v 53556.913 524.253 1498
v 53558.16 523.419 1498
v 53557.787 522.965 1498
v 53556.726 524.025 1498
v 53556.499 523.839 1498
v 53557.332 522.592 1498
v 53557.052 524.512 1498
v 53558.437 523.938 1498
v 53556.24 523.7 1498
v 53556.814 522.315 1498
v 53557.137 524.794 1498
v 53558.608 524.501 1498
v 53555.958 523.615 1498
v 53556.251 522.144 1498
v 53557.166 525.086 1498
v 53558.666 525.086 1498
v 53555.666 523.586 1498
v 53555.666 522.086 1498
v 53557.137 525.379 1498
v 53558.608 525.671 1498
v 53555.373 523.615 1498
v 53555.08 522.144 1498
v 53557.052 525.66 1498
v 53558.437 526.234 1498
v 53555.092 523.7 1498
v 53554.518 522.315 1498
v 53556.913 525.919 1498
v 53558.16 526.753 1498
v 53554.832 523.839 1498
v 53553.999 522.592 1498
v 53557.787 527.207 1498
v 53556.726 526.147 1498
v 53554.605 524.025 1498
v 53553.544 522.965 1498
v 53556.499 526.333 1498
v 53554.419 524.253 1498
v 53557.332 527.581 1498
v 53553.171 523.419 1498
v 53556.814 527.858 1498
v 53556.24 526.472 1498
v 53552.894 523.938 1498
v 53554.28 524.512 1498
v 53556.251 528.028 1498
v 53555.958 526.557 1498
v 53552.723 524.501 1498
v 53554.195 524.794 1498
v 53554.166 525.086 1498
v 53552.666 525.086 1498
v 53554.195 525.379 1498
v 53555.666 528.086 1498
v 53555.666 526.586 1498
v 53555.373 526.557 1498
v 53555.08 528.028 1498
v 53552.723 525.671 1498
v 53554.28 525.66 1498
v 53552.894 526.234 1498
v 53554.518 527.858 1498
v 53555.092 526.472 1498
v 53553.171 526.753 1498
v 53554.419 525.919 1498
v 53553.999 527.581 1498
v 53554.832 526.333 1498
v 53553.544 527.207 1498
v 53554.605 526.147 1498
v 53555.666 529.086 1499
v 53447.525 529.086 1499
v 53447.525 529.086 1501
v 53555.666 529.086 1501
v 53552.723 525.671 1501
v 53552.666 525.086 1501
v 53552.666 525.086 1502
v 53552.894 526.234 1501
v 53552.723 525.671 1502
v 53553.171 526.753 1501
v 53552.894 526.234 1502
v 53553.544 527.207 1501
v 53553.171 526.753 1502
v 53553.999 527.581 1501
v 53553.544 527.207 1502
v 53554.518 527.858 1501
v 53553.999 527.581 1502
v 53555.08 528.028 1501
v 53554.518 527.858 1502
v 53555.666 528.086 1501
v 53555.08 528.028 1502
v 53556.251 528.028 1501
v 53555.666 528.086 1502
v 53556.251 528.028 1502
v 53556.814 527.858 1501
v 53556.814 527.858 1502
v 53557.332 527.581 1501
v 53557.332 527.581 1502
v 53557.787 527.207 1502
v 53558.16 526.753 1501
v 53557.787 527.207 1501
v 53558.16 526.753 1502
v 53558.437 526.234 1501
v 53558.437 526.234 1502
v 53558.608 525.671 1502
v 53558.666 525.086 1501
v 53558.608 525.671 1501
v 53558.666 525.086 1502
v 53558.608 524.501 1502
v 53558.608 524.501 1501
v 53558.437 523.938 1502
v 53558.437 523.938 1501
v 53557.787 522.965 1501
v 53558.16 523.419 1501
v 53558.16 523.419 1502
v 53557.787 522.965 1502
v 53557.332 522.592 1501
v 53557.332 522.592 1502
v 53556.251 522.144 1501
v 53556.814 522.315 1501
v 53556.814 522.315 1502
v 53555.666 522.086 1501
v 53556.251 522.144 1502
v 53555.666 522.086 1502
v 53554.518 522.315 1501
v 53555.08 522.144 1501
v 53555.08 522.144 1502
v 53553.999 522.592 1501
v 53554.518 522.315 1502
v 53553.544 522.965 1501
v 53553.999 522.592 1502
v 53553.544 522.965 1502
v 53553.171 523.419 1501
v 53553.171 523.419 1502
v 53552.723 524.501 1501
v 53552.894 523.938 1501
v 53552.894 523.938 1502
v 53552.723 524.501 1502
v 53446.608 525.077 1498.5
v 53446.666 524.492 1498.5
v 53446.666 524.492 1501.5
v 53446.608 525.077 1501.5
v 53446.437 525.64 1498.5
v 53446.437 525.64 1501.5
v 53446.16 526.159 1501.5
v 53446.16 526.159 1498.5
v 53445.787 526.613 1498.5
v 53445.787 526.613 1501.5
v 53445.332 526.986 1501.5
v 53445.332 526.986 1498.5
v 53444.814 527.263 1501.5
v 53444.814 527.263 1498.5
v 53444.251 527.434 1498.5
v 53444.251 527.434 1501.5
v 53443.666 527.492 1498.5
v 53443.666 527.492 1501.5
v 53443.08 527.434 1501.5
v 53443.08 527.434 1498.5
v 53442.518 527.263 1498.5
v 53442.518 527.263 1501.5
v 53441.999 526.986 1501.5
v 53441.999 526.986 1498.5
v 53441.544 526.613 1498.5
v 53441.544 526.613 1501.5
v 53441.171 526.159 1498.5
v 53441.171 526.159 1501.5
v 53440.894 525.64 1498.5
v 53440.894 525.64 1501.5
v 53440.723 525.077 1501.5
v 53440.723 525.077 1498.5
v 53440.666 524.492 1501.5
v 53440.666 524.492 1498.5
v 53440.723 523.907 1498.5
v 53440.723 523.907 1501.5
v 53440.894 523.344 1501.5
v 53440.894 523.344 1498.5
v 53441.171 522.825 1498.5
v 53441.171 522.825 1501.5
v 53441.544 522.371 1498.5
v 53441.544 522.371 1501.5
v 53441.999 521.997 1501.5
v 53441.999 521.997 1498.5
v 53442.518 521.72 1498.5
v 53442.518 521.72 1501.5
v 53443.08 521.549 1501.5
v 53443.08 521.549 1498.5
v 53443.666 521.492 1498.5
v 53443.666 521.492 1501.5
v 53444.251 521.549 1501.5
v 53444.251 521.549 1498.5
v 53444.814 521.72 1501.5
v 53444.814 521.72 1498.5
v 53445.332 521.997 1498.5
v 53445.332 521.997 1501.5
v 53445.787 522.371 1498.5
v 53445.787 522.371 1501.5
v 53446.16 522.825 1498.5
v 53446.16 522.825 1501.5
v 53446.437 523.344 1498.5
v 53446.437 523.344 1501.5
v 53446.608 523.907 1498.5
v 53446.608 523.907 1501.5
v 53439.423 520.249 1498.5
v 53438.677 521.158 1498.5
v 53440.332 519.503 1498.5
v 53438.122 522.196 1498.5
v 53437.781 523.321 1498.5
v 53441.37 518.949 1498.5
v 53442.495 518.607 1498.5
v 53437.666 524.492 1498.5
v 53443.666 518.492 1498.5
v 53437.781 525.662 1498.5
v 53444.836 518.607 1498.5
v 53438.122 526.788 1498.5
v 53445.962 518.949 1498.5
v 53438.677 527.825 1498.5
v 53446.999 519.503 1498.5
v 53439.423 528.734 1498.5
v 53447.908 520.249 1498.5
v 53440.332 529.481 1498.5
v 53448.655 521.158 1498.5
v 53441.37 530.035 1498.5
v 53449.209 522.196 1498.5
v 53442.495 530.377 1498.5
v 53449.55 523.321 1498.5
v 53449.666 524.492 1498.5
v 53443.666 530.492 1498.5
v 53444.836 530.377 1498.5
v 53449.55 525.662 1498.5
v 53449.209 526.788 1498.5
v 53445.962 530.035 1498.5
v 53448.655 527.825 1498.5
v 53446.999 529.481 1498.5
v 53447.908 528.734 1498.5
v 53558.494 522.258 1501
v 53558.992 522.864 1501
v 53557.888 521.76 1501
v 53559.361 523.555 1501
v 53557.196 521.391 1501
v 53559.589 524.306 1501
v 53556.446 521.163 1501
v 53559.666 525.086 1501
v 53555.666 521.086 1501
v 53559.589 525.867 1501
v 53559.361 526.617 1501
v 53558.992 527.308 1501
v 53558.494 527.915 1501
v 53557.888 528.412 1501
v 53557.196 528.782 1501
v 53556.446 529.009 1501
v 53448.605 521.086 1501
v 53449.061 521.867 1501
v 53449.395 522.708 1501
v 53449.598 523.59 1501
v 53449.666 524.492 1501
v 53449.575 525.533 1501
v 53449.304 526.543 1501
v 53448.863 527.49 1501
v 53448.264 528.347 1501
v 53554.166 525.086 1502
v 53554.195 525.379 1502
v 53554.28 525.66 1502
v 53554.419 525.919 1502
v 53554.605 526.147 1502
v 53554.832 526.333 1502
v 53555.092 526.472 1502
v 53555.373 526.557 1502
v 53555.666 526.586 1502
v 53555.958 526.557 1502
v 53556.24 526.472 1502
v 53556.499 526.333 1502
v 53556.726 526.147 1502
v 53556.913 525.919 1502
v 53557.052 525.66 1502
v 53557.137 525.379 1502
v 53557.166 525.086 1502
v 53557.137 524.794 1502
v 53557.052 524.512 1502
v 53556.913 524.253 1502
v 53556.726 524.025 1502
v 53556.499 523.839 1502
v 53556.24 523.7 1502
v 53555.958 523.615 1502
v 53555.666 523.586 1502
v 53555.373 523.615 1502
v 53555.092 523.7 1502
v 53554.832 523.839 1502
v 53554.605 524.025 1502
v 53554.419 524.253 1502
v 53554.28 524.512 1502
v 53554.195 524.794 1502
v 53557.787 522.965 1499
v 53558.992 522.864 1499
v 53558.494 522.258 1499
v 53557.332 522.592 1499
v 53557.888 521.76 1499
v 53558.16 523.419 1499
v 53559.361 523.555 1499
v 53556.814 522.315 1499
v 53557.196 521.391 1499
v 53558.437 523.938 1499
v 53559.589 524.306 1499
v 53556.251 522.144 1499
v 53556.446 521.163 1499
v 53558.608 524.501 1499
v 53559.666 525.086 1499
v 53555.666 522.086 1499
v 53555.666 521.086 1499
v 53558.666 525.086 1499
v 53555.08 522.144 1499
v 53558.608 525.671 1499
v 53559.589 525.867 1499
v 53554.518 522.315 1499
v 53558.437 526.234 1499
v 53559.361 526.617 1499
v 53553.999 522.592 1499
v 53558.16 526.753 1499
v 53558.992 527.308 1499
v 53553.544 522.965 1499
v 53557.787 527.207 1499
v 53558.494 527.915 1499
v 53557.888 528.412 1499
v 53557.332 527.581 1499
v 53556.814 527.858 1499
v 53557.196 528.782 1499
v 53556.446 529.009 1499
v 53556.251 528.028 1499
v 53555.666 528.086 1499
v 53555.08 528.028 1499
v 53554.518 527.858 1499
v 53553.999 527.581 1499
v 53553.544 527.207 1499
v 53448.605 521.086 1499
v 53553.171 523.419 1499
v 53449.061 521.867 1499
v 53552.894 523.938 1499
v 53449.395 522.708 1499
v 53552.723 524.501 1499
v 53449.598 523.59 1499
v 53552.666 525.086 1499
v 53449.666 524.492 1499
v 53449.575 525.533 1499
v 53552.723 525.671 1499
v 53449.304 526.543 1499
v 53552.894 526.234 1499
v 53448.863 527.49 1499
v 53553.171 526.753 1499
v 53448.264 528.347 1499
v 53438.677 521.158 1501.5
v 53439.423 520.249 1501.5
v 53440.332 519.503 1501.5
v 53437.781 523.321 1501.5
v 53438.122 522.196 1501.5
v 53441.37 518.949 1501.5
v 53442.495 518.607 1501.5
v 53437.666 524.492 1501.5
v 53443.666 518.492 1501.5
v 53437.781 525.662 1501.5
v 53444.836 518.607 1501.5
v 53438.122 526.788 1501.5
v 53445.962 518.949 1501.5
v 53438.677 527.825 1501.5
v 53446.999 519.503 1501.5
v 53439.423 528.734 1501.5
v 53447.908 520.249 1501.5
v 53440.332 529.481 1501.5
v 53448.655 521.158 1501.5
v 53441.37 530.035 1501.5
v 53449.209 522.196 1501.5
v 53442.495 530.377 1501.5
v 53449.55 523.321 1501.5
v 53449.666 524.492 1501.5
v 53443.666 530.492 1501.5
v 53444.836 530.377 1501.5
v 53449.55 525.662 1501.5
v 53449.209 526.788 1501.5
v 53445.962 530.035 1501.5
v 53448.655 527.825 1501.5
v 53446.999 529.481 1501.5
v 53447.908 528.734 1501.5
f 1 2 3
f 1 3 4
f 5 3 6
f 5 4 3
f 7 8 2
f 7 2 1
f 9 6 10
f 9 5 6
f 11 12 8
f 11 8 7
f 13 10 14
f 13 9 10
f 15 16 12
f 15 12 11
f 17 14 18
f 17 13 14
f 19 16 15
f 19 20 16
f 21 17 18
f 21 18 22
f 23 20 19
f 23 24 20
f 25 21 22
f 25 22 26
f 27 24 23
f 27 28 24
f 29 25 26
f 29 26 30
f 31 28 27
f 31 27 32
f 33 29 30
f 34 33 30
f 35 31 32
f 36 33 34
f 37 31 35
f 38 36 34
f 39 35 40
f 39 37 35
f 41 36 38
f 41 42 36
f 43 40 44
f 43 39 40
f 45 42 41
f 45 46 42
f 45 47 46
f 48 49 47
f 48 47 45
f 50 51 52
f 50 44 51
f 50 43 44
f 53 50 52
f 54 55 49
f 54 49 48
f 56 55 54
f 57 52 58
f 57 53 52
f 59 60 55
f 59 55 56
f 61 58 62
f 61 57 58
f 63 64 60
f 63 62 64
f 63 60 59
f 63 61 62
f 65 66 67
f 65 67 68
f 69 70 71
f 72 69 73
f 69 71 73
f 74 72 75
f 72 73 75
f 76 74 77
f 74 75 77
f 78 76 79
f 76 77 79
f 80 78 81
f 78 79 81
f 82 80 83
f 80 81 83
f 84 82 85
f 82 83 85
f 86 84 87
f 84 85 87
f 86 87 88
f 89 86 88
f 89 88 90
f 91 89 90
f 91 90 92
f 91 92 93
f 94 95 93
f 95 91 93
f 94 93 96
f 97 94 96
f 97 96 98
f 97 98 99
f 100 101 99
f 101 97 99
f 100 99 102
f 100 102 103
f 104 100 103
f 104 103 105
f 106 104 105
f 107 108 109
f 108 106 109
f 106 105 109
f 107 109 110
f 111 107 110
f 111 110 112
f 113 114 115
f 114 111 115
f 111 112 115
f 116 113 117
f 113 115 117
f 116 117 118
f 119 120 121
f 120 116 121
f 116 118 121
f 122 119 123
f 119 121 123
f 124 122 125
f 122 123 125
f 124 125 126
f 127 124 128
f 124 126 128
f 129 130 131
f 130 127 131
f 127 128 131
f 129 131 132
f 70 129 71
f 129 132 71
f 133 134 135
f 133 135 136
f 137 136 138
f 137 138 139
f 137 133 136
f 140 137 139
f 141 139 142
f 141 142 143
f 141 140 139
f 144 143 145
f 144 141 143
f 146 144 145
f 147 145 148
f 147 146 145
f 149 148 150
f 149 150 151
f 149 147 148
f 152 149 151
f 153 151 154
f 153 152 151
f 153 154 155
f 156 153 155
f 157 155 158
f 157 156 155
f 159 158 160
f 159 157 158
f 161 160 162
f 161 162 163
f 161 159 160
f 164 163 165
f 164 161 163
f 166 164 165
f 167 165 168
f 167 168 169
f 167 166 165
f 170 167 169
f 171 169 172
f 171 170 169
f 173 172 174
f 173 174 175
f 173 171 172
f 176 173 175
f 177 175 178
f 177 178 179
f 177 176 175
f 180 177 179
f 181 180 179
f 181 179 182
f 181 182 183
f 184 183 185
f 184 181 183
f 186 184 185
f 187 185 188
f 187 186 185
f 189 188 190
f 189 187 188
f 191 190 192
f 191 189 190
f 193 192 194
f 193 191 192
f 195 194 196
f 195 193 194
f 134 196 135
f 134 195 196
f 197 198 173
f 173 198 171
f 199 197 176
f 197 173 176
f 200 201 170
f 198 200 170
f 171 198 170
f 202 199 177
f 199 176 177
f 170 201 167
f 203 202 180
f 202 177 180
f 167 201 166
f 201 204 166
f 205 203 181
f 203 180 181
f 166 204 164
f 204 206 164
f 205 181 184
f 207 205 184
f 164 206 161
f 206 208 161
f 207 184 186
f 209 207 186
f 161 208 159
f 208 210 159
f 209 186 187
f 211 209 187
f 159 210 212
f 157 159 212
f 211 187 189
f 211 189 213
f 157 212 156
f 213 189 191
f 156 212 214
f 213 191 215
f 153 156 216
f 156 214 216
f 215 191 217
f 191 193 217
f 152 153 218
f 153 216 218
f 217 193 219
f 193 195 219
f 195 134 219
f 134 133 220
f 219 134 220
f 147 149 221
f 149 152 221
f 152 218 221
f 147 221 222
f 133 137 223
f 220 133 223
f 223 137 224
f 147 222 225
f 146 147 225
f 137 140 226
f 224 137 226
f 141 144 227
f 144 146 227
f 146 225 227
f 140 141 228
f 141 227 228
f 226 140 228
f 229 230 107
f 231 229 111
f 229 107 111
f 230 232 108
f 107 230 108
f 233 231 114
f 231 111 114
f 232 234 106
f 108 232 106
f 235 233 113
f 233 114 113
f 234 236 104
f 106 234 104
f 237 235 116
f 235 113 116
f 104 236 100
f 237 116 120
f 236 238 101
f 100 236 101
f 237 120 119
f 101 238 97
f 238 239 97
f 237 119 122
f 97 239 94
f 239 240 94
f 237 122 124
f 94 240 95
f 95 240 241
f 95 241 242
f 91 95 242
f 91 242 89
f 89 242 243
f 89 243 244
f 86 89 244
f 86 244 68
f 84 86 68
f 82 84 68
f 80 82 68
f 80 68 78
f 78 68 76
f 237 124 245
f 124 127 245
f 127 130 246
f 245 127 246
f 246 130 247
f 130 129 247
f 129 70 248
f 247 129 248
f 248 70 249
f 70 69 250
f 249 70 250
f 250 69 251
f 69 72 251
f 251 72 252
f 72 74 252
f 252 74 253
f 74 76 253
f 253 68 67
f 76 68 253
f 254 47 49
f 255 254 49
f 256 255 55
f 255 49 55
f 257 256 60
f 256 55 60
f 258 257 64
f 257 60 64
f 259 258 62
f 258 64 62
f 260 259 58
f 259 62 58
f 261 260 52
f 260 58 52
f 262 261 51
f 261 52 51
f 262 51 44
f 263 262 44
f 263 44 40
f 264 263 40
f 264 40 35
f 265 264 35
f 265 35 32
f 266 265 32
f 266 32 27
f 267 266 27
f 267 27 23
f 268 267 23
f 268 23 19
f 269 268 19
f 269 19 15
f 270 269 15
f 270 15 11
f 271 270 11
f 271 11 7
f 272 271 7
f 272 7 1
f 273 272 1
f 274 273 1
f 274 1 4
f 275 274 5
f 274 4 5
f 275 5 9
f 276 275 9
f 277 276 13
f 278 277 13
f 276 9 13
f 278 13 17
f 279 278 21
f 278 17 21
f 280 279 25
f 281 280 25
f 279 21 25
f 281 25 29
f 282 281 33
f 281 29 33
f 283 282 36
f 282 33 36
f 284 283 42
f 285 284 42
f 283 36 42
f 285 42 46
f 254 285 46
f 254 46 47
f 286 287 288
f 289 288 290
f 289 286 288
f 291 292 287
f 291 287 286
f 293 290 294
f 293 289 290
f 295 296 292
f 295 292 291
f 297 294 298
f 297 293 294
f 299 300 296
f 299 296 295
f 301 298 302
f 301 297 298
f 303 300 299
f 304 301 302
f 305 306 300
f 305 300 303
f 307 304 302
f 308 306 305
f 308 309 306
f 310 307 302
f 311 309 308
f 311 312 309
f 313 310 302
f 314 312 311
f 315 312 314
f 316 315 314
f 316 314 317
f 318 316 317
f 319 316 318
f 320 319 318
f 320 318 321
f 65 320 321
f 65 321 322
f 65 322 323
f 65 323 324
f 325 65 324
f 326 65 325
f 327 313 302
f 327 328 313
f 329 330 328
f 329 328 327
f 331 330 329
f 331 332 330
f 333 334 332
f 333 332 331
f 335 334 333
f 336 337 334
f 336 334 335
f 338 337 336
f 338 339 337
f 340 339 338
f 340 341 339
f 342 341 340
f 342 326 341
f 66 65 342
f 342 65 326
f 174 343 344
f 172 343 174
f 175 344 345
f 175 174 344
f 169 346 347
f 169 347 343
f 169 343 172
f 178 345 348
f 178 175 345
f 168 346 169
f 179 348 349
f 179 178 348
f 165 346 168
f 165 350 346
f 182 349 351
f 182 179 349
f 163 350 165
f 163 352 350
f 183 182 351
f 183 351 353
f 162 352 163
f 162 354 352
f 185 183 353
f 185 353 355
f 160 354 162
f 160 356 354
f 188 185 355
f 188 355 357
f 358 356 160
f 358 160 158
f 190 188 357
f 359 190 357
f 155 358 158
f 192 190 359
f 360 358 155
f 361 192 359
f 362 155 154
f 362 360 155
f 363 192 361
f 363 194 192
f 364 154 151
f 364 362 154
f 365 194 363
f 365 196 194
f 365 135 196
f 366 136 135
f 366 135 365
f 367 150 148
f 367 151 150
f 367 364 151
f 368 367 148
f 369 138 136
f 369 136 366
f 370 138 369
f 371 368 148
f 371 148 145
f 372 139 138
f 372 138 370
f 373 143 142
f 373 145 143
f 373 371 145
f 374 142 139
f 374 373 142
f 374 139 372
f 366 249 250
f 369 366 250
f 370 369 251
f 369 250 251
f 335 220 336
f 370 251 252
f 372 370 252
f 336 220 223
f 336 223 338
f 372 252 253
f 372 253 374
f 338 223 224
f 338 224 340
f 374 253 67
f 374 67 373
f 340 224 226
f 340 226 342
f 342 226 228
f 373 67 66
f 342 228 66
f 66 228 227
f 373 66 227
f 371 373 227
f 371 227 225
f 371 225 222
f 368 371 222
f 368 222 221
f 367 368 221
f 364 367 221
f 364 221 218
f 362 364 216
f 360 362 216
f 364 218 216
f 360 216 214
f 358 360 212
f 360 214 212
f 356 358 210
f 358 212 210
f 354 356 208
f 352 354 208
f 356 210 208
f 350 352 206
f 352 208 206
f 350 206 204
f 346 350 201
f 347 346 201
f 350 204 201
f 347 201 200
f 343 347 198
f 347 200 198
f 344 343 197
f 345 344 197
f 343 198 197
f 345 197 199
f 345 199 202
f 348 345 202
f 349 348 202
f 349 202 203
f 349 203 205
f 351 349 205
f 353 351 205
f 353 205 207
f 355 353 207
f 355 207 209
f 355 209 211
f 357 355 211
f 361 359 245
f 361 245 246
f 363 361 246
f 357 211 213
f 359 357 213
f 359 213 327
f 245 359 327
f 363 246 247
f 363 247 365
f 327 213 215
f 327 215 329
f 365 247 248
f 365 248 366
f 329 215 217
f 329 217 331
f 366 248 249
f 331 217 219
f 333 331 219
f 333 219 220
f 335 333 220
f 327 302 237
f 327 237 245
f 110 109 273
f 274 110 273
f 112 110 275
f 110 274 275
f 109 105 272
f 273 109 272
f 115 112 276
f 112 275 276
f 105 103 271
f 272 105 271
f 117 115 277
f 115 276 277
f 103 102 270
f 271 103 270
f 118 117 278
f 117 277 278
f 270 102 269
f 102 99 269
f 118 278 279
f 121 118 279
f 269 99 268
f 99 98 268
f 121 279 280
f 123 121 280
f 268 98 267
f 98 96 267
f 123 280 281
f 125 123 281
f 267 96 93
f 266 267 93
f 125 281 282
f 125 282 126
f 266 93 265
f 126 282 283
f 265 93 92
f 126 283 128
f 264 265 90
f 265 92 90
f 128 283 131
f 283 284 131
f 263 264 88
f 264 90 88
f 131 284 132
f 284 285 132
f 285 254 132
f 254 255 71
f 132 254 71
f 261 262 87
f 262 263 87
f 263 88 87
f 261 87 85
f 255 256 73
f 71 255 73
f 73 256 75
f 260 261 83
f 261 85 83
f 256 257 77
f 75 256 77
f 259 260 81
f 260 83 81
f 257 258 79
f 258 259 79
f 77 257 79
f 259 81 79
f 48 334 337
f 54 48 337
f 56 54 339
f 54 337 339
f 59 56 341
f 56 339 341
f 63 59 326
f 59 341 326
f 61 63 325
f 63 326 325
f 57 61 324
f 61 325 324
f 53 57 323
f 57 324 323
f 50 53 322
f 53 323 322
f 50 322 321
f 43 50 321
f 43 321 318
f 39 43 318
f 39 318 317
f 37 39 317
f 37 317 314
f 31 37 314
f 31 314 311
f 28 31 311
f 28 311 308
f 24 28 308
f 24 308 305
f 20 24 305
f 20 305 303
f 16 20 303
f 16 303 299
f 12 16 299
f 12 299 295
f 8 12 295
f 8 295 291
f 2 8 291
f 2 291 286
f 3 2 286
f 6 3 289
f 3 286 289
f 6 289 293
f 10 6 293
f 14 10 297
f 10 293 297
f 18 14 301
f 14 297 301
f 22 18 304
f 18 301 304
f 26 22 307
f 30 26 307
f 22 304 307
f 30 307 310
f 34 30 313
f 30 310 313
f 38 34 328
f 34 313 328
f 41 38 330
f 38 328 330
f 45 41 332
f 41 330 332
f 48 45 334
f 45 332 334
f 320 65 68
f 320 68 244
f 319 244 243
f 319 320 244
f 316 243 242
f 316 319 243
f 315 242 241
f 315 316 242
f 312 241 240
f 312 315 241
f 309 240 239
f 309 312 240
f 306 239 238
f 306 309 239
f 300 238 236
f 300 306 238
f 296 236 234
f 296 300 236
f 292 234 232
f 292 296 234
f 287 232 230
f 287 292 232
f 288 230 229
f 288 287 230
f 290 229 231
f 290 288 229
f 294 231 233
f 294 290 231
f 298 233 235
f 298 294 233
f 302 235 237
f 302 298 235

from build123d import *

# Parameters (mm, degrees)
SKETCH2_R                = 6000
SKETCH2_R_2              = 3000
BOSS_EXTRUDE1_DEPTH      = 3000
BOSS_EXTRUDE2_DEPTH      = 1000
BOSS_EXTRUDE2_DEPTH_BACK = 1000
BOSS_EXTRUDE3_DEPTH      = 1000
BOSS_EXTRUDE3_DEPTH_BACK = 3000
SKETCH4_R                = 3000
SKETCH5_R                = 1500
CUT_EXTRUDE1_DEPTH       = 5000
SCALE1_SCALE             = 0.001


with BuildPart() as part:
    # Sketch2 → Boss-Extrude1 (new body)
    with BuildSketch(Plane.XY):
        Circle(SKETCH2_R)
        Circle(SKETCH2_R_2, mode=Mode.SUBTRACT)
    extrude(amount=BOSS_EXTRUDE1_DEPTH)

    # Sketch3 → Boss-Extrude2 (add, two sides: drawn at the far end of the back side and taken through both)
    with BuildSketch(Plane.XY.offset(1500).offset(-BOSS_EXTRUDE2_DEPTH_BACK)):
        with BuildLine():
            Line((1140.414956358, 4594.307428083), (112000, 4594.307428083))
            ThreePointArc((112000, 4594.307428083), (116000, 594.307428083), (112000, -3405.692571917))
            Line((112000, -3405.692571917), (3287.775102105, -3405.692571917))
            ThreePointArc((3287.775102105, -3405.692571917), (4571.894224331, 1227.187930987), (1140.414956358, 4594.307428083))
        make_face()
    extrude(amount=BOSS_EXTRUDE2_DEPTH + BOSS_EXTRUDE2_DEPTH_BACK)

    # Sketch4 → Boss-Extrude3 (add, two sides: drawn at the far end of the back side and taken through both)
    with BuildSketch(Plane(origin=(0, 0, 500), x_dir=(-1, 0, 0), z_dir=(0, 0, -1)).offset(-BOSS_EXTRUDE3_DEPTH_BACK)):
        with Locations((-112000, 594.307428083)):
            Circle(SKETCH4_R)
    extrude(amount=BOSS_EXTRUDE3_DEPTH + BOSS_EXTRUDE3_DEPTH_BACK)

    # Sketch5 → Cut-Extrude1 (cut)
    with BuildSketch(Plane(origin=(0, 0, -500), x_dir=(-1, 0, 0), z_dir=(0, 0, -1))):
        with Locations((-112000, 594.307428083)):
            Circle(SKETCH5_R)
    extrude(amount=-CUT_EXTRUDE1_DEPTH, mode=Mode.SUBTRACT)


with BuildPart() as part_1:
    # Scale1: scaled about (53497.162872558, 525.016851584, 1500)
    add(part.part.scale(SCALE1_SCALE).moved(Location((53443.665709685, 524.491834732, 1498.5))))


solid = part_1.part
